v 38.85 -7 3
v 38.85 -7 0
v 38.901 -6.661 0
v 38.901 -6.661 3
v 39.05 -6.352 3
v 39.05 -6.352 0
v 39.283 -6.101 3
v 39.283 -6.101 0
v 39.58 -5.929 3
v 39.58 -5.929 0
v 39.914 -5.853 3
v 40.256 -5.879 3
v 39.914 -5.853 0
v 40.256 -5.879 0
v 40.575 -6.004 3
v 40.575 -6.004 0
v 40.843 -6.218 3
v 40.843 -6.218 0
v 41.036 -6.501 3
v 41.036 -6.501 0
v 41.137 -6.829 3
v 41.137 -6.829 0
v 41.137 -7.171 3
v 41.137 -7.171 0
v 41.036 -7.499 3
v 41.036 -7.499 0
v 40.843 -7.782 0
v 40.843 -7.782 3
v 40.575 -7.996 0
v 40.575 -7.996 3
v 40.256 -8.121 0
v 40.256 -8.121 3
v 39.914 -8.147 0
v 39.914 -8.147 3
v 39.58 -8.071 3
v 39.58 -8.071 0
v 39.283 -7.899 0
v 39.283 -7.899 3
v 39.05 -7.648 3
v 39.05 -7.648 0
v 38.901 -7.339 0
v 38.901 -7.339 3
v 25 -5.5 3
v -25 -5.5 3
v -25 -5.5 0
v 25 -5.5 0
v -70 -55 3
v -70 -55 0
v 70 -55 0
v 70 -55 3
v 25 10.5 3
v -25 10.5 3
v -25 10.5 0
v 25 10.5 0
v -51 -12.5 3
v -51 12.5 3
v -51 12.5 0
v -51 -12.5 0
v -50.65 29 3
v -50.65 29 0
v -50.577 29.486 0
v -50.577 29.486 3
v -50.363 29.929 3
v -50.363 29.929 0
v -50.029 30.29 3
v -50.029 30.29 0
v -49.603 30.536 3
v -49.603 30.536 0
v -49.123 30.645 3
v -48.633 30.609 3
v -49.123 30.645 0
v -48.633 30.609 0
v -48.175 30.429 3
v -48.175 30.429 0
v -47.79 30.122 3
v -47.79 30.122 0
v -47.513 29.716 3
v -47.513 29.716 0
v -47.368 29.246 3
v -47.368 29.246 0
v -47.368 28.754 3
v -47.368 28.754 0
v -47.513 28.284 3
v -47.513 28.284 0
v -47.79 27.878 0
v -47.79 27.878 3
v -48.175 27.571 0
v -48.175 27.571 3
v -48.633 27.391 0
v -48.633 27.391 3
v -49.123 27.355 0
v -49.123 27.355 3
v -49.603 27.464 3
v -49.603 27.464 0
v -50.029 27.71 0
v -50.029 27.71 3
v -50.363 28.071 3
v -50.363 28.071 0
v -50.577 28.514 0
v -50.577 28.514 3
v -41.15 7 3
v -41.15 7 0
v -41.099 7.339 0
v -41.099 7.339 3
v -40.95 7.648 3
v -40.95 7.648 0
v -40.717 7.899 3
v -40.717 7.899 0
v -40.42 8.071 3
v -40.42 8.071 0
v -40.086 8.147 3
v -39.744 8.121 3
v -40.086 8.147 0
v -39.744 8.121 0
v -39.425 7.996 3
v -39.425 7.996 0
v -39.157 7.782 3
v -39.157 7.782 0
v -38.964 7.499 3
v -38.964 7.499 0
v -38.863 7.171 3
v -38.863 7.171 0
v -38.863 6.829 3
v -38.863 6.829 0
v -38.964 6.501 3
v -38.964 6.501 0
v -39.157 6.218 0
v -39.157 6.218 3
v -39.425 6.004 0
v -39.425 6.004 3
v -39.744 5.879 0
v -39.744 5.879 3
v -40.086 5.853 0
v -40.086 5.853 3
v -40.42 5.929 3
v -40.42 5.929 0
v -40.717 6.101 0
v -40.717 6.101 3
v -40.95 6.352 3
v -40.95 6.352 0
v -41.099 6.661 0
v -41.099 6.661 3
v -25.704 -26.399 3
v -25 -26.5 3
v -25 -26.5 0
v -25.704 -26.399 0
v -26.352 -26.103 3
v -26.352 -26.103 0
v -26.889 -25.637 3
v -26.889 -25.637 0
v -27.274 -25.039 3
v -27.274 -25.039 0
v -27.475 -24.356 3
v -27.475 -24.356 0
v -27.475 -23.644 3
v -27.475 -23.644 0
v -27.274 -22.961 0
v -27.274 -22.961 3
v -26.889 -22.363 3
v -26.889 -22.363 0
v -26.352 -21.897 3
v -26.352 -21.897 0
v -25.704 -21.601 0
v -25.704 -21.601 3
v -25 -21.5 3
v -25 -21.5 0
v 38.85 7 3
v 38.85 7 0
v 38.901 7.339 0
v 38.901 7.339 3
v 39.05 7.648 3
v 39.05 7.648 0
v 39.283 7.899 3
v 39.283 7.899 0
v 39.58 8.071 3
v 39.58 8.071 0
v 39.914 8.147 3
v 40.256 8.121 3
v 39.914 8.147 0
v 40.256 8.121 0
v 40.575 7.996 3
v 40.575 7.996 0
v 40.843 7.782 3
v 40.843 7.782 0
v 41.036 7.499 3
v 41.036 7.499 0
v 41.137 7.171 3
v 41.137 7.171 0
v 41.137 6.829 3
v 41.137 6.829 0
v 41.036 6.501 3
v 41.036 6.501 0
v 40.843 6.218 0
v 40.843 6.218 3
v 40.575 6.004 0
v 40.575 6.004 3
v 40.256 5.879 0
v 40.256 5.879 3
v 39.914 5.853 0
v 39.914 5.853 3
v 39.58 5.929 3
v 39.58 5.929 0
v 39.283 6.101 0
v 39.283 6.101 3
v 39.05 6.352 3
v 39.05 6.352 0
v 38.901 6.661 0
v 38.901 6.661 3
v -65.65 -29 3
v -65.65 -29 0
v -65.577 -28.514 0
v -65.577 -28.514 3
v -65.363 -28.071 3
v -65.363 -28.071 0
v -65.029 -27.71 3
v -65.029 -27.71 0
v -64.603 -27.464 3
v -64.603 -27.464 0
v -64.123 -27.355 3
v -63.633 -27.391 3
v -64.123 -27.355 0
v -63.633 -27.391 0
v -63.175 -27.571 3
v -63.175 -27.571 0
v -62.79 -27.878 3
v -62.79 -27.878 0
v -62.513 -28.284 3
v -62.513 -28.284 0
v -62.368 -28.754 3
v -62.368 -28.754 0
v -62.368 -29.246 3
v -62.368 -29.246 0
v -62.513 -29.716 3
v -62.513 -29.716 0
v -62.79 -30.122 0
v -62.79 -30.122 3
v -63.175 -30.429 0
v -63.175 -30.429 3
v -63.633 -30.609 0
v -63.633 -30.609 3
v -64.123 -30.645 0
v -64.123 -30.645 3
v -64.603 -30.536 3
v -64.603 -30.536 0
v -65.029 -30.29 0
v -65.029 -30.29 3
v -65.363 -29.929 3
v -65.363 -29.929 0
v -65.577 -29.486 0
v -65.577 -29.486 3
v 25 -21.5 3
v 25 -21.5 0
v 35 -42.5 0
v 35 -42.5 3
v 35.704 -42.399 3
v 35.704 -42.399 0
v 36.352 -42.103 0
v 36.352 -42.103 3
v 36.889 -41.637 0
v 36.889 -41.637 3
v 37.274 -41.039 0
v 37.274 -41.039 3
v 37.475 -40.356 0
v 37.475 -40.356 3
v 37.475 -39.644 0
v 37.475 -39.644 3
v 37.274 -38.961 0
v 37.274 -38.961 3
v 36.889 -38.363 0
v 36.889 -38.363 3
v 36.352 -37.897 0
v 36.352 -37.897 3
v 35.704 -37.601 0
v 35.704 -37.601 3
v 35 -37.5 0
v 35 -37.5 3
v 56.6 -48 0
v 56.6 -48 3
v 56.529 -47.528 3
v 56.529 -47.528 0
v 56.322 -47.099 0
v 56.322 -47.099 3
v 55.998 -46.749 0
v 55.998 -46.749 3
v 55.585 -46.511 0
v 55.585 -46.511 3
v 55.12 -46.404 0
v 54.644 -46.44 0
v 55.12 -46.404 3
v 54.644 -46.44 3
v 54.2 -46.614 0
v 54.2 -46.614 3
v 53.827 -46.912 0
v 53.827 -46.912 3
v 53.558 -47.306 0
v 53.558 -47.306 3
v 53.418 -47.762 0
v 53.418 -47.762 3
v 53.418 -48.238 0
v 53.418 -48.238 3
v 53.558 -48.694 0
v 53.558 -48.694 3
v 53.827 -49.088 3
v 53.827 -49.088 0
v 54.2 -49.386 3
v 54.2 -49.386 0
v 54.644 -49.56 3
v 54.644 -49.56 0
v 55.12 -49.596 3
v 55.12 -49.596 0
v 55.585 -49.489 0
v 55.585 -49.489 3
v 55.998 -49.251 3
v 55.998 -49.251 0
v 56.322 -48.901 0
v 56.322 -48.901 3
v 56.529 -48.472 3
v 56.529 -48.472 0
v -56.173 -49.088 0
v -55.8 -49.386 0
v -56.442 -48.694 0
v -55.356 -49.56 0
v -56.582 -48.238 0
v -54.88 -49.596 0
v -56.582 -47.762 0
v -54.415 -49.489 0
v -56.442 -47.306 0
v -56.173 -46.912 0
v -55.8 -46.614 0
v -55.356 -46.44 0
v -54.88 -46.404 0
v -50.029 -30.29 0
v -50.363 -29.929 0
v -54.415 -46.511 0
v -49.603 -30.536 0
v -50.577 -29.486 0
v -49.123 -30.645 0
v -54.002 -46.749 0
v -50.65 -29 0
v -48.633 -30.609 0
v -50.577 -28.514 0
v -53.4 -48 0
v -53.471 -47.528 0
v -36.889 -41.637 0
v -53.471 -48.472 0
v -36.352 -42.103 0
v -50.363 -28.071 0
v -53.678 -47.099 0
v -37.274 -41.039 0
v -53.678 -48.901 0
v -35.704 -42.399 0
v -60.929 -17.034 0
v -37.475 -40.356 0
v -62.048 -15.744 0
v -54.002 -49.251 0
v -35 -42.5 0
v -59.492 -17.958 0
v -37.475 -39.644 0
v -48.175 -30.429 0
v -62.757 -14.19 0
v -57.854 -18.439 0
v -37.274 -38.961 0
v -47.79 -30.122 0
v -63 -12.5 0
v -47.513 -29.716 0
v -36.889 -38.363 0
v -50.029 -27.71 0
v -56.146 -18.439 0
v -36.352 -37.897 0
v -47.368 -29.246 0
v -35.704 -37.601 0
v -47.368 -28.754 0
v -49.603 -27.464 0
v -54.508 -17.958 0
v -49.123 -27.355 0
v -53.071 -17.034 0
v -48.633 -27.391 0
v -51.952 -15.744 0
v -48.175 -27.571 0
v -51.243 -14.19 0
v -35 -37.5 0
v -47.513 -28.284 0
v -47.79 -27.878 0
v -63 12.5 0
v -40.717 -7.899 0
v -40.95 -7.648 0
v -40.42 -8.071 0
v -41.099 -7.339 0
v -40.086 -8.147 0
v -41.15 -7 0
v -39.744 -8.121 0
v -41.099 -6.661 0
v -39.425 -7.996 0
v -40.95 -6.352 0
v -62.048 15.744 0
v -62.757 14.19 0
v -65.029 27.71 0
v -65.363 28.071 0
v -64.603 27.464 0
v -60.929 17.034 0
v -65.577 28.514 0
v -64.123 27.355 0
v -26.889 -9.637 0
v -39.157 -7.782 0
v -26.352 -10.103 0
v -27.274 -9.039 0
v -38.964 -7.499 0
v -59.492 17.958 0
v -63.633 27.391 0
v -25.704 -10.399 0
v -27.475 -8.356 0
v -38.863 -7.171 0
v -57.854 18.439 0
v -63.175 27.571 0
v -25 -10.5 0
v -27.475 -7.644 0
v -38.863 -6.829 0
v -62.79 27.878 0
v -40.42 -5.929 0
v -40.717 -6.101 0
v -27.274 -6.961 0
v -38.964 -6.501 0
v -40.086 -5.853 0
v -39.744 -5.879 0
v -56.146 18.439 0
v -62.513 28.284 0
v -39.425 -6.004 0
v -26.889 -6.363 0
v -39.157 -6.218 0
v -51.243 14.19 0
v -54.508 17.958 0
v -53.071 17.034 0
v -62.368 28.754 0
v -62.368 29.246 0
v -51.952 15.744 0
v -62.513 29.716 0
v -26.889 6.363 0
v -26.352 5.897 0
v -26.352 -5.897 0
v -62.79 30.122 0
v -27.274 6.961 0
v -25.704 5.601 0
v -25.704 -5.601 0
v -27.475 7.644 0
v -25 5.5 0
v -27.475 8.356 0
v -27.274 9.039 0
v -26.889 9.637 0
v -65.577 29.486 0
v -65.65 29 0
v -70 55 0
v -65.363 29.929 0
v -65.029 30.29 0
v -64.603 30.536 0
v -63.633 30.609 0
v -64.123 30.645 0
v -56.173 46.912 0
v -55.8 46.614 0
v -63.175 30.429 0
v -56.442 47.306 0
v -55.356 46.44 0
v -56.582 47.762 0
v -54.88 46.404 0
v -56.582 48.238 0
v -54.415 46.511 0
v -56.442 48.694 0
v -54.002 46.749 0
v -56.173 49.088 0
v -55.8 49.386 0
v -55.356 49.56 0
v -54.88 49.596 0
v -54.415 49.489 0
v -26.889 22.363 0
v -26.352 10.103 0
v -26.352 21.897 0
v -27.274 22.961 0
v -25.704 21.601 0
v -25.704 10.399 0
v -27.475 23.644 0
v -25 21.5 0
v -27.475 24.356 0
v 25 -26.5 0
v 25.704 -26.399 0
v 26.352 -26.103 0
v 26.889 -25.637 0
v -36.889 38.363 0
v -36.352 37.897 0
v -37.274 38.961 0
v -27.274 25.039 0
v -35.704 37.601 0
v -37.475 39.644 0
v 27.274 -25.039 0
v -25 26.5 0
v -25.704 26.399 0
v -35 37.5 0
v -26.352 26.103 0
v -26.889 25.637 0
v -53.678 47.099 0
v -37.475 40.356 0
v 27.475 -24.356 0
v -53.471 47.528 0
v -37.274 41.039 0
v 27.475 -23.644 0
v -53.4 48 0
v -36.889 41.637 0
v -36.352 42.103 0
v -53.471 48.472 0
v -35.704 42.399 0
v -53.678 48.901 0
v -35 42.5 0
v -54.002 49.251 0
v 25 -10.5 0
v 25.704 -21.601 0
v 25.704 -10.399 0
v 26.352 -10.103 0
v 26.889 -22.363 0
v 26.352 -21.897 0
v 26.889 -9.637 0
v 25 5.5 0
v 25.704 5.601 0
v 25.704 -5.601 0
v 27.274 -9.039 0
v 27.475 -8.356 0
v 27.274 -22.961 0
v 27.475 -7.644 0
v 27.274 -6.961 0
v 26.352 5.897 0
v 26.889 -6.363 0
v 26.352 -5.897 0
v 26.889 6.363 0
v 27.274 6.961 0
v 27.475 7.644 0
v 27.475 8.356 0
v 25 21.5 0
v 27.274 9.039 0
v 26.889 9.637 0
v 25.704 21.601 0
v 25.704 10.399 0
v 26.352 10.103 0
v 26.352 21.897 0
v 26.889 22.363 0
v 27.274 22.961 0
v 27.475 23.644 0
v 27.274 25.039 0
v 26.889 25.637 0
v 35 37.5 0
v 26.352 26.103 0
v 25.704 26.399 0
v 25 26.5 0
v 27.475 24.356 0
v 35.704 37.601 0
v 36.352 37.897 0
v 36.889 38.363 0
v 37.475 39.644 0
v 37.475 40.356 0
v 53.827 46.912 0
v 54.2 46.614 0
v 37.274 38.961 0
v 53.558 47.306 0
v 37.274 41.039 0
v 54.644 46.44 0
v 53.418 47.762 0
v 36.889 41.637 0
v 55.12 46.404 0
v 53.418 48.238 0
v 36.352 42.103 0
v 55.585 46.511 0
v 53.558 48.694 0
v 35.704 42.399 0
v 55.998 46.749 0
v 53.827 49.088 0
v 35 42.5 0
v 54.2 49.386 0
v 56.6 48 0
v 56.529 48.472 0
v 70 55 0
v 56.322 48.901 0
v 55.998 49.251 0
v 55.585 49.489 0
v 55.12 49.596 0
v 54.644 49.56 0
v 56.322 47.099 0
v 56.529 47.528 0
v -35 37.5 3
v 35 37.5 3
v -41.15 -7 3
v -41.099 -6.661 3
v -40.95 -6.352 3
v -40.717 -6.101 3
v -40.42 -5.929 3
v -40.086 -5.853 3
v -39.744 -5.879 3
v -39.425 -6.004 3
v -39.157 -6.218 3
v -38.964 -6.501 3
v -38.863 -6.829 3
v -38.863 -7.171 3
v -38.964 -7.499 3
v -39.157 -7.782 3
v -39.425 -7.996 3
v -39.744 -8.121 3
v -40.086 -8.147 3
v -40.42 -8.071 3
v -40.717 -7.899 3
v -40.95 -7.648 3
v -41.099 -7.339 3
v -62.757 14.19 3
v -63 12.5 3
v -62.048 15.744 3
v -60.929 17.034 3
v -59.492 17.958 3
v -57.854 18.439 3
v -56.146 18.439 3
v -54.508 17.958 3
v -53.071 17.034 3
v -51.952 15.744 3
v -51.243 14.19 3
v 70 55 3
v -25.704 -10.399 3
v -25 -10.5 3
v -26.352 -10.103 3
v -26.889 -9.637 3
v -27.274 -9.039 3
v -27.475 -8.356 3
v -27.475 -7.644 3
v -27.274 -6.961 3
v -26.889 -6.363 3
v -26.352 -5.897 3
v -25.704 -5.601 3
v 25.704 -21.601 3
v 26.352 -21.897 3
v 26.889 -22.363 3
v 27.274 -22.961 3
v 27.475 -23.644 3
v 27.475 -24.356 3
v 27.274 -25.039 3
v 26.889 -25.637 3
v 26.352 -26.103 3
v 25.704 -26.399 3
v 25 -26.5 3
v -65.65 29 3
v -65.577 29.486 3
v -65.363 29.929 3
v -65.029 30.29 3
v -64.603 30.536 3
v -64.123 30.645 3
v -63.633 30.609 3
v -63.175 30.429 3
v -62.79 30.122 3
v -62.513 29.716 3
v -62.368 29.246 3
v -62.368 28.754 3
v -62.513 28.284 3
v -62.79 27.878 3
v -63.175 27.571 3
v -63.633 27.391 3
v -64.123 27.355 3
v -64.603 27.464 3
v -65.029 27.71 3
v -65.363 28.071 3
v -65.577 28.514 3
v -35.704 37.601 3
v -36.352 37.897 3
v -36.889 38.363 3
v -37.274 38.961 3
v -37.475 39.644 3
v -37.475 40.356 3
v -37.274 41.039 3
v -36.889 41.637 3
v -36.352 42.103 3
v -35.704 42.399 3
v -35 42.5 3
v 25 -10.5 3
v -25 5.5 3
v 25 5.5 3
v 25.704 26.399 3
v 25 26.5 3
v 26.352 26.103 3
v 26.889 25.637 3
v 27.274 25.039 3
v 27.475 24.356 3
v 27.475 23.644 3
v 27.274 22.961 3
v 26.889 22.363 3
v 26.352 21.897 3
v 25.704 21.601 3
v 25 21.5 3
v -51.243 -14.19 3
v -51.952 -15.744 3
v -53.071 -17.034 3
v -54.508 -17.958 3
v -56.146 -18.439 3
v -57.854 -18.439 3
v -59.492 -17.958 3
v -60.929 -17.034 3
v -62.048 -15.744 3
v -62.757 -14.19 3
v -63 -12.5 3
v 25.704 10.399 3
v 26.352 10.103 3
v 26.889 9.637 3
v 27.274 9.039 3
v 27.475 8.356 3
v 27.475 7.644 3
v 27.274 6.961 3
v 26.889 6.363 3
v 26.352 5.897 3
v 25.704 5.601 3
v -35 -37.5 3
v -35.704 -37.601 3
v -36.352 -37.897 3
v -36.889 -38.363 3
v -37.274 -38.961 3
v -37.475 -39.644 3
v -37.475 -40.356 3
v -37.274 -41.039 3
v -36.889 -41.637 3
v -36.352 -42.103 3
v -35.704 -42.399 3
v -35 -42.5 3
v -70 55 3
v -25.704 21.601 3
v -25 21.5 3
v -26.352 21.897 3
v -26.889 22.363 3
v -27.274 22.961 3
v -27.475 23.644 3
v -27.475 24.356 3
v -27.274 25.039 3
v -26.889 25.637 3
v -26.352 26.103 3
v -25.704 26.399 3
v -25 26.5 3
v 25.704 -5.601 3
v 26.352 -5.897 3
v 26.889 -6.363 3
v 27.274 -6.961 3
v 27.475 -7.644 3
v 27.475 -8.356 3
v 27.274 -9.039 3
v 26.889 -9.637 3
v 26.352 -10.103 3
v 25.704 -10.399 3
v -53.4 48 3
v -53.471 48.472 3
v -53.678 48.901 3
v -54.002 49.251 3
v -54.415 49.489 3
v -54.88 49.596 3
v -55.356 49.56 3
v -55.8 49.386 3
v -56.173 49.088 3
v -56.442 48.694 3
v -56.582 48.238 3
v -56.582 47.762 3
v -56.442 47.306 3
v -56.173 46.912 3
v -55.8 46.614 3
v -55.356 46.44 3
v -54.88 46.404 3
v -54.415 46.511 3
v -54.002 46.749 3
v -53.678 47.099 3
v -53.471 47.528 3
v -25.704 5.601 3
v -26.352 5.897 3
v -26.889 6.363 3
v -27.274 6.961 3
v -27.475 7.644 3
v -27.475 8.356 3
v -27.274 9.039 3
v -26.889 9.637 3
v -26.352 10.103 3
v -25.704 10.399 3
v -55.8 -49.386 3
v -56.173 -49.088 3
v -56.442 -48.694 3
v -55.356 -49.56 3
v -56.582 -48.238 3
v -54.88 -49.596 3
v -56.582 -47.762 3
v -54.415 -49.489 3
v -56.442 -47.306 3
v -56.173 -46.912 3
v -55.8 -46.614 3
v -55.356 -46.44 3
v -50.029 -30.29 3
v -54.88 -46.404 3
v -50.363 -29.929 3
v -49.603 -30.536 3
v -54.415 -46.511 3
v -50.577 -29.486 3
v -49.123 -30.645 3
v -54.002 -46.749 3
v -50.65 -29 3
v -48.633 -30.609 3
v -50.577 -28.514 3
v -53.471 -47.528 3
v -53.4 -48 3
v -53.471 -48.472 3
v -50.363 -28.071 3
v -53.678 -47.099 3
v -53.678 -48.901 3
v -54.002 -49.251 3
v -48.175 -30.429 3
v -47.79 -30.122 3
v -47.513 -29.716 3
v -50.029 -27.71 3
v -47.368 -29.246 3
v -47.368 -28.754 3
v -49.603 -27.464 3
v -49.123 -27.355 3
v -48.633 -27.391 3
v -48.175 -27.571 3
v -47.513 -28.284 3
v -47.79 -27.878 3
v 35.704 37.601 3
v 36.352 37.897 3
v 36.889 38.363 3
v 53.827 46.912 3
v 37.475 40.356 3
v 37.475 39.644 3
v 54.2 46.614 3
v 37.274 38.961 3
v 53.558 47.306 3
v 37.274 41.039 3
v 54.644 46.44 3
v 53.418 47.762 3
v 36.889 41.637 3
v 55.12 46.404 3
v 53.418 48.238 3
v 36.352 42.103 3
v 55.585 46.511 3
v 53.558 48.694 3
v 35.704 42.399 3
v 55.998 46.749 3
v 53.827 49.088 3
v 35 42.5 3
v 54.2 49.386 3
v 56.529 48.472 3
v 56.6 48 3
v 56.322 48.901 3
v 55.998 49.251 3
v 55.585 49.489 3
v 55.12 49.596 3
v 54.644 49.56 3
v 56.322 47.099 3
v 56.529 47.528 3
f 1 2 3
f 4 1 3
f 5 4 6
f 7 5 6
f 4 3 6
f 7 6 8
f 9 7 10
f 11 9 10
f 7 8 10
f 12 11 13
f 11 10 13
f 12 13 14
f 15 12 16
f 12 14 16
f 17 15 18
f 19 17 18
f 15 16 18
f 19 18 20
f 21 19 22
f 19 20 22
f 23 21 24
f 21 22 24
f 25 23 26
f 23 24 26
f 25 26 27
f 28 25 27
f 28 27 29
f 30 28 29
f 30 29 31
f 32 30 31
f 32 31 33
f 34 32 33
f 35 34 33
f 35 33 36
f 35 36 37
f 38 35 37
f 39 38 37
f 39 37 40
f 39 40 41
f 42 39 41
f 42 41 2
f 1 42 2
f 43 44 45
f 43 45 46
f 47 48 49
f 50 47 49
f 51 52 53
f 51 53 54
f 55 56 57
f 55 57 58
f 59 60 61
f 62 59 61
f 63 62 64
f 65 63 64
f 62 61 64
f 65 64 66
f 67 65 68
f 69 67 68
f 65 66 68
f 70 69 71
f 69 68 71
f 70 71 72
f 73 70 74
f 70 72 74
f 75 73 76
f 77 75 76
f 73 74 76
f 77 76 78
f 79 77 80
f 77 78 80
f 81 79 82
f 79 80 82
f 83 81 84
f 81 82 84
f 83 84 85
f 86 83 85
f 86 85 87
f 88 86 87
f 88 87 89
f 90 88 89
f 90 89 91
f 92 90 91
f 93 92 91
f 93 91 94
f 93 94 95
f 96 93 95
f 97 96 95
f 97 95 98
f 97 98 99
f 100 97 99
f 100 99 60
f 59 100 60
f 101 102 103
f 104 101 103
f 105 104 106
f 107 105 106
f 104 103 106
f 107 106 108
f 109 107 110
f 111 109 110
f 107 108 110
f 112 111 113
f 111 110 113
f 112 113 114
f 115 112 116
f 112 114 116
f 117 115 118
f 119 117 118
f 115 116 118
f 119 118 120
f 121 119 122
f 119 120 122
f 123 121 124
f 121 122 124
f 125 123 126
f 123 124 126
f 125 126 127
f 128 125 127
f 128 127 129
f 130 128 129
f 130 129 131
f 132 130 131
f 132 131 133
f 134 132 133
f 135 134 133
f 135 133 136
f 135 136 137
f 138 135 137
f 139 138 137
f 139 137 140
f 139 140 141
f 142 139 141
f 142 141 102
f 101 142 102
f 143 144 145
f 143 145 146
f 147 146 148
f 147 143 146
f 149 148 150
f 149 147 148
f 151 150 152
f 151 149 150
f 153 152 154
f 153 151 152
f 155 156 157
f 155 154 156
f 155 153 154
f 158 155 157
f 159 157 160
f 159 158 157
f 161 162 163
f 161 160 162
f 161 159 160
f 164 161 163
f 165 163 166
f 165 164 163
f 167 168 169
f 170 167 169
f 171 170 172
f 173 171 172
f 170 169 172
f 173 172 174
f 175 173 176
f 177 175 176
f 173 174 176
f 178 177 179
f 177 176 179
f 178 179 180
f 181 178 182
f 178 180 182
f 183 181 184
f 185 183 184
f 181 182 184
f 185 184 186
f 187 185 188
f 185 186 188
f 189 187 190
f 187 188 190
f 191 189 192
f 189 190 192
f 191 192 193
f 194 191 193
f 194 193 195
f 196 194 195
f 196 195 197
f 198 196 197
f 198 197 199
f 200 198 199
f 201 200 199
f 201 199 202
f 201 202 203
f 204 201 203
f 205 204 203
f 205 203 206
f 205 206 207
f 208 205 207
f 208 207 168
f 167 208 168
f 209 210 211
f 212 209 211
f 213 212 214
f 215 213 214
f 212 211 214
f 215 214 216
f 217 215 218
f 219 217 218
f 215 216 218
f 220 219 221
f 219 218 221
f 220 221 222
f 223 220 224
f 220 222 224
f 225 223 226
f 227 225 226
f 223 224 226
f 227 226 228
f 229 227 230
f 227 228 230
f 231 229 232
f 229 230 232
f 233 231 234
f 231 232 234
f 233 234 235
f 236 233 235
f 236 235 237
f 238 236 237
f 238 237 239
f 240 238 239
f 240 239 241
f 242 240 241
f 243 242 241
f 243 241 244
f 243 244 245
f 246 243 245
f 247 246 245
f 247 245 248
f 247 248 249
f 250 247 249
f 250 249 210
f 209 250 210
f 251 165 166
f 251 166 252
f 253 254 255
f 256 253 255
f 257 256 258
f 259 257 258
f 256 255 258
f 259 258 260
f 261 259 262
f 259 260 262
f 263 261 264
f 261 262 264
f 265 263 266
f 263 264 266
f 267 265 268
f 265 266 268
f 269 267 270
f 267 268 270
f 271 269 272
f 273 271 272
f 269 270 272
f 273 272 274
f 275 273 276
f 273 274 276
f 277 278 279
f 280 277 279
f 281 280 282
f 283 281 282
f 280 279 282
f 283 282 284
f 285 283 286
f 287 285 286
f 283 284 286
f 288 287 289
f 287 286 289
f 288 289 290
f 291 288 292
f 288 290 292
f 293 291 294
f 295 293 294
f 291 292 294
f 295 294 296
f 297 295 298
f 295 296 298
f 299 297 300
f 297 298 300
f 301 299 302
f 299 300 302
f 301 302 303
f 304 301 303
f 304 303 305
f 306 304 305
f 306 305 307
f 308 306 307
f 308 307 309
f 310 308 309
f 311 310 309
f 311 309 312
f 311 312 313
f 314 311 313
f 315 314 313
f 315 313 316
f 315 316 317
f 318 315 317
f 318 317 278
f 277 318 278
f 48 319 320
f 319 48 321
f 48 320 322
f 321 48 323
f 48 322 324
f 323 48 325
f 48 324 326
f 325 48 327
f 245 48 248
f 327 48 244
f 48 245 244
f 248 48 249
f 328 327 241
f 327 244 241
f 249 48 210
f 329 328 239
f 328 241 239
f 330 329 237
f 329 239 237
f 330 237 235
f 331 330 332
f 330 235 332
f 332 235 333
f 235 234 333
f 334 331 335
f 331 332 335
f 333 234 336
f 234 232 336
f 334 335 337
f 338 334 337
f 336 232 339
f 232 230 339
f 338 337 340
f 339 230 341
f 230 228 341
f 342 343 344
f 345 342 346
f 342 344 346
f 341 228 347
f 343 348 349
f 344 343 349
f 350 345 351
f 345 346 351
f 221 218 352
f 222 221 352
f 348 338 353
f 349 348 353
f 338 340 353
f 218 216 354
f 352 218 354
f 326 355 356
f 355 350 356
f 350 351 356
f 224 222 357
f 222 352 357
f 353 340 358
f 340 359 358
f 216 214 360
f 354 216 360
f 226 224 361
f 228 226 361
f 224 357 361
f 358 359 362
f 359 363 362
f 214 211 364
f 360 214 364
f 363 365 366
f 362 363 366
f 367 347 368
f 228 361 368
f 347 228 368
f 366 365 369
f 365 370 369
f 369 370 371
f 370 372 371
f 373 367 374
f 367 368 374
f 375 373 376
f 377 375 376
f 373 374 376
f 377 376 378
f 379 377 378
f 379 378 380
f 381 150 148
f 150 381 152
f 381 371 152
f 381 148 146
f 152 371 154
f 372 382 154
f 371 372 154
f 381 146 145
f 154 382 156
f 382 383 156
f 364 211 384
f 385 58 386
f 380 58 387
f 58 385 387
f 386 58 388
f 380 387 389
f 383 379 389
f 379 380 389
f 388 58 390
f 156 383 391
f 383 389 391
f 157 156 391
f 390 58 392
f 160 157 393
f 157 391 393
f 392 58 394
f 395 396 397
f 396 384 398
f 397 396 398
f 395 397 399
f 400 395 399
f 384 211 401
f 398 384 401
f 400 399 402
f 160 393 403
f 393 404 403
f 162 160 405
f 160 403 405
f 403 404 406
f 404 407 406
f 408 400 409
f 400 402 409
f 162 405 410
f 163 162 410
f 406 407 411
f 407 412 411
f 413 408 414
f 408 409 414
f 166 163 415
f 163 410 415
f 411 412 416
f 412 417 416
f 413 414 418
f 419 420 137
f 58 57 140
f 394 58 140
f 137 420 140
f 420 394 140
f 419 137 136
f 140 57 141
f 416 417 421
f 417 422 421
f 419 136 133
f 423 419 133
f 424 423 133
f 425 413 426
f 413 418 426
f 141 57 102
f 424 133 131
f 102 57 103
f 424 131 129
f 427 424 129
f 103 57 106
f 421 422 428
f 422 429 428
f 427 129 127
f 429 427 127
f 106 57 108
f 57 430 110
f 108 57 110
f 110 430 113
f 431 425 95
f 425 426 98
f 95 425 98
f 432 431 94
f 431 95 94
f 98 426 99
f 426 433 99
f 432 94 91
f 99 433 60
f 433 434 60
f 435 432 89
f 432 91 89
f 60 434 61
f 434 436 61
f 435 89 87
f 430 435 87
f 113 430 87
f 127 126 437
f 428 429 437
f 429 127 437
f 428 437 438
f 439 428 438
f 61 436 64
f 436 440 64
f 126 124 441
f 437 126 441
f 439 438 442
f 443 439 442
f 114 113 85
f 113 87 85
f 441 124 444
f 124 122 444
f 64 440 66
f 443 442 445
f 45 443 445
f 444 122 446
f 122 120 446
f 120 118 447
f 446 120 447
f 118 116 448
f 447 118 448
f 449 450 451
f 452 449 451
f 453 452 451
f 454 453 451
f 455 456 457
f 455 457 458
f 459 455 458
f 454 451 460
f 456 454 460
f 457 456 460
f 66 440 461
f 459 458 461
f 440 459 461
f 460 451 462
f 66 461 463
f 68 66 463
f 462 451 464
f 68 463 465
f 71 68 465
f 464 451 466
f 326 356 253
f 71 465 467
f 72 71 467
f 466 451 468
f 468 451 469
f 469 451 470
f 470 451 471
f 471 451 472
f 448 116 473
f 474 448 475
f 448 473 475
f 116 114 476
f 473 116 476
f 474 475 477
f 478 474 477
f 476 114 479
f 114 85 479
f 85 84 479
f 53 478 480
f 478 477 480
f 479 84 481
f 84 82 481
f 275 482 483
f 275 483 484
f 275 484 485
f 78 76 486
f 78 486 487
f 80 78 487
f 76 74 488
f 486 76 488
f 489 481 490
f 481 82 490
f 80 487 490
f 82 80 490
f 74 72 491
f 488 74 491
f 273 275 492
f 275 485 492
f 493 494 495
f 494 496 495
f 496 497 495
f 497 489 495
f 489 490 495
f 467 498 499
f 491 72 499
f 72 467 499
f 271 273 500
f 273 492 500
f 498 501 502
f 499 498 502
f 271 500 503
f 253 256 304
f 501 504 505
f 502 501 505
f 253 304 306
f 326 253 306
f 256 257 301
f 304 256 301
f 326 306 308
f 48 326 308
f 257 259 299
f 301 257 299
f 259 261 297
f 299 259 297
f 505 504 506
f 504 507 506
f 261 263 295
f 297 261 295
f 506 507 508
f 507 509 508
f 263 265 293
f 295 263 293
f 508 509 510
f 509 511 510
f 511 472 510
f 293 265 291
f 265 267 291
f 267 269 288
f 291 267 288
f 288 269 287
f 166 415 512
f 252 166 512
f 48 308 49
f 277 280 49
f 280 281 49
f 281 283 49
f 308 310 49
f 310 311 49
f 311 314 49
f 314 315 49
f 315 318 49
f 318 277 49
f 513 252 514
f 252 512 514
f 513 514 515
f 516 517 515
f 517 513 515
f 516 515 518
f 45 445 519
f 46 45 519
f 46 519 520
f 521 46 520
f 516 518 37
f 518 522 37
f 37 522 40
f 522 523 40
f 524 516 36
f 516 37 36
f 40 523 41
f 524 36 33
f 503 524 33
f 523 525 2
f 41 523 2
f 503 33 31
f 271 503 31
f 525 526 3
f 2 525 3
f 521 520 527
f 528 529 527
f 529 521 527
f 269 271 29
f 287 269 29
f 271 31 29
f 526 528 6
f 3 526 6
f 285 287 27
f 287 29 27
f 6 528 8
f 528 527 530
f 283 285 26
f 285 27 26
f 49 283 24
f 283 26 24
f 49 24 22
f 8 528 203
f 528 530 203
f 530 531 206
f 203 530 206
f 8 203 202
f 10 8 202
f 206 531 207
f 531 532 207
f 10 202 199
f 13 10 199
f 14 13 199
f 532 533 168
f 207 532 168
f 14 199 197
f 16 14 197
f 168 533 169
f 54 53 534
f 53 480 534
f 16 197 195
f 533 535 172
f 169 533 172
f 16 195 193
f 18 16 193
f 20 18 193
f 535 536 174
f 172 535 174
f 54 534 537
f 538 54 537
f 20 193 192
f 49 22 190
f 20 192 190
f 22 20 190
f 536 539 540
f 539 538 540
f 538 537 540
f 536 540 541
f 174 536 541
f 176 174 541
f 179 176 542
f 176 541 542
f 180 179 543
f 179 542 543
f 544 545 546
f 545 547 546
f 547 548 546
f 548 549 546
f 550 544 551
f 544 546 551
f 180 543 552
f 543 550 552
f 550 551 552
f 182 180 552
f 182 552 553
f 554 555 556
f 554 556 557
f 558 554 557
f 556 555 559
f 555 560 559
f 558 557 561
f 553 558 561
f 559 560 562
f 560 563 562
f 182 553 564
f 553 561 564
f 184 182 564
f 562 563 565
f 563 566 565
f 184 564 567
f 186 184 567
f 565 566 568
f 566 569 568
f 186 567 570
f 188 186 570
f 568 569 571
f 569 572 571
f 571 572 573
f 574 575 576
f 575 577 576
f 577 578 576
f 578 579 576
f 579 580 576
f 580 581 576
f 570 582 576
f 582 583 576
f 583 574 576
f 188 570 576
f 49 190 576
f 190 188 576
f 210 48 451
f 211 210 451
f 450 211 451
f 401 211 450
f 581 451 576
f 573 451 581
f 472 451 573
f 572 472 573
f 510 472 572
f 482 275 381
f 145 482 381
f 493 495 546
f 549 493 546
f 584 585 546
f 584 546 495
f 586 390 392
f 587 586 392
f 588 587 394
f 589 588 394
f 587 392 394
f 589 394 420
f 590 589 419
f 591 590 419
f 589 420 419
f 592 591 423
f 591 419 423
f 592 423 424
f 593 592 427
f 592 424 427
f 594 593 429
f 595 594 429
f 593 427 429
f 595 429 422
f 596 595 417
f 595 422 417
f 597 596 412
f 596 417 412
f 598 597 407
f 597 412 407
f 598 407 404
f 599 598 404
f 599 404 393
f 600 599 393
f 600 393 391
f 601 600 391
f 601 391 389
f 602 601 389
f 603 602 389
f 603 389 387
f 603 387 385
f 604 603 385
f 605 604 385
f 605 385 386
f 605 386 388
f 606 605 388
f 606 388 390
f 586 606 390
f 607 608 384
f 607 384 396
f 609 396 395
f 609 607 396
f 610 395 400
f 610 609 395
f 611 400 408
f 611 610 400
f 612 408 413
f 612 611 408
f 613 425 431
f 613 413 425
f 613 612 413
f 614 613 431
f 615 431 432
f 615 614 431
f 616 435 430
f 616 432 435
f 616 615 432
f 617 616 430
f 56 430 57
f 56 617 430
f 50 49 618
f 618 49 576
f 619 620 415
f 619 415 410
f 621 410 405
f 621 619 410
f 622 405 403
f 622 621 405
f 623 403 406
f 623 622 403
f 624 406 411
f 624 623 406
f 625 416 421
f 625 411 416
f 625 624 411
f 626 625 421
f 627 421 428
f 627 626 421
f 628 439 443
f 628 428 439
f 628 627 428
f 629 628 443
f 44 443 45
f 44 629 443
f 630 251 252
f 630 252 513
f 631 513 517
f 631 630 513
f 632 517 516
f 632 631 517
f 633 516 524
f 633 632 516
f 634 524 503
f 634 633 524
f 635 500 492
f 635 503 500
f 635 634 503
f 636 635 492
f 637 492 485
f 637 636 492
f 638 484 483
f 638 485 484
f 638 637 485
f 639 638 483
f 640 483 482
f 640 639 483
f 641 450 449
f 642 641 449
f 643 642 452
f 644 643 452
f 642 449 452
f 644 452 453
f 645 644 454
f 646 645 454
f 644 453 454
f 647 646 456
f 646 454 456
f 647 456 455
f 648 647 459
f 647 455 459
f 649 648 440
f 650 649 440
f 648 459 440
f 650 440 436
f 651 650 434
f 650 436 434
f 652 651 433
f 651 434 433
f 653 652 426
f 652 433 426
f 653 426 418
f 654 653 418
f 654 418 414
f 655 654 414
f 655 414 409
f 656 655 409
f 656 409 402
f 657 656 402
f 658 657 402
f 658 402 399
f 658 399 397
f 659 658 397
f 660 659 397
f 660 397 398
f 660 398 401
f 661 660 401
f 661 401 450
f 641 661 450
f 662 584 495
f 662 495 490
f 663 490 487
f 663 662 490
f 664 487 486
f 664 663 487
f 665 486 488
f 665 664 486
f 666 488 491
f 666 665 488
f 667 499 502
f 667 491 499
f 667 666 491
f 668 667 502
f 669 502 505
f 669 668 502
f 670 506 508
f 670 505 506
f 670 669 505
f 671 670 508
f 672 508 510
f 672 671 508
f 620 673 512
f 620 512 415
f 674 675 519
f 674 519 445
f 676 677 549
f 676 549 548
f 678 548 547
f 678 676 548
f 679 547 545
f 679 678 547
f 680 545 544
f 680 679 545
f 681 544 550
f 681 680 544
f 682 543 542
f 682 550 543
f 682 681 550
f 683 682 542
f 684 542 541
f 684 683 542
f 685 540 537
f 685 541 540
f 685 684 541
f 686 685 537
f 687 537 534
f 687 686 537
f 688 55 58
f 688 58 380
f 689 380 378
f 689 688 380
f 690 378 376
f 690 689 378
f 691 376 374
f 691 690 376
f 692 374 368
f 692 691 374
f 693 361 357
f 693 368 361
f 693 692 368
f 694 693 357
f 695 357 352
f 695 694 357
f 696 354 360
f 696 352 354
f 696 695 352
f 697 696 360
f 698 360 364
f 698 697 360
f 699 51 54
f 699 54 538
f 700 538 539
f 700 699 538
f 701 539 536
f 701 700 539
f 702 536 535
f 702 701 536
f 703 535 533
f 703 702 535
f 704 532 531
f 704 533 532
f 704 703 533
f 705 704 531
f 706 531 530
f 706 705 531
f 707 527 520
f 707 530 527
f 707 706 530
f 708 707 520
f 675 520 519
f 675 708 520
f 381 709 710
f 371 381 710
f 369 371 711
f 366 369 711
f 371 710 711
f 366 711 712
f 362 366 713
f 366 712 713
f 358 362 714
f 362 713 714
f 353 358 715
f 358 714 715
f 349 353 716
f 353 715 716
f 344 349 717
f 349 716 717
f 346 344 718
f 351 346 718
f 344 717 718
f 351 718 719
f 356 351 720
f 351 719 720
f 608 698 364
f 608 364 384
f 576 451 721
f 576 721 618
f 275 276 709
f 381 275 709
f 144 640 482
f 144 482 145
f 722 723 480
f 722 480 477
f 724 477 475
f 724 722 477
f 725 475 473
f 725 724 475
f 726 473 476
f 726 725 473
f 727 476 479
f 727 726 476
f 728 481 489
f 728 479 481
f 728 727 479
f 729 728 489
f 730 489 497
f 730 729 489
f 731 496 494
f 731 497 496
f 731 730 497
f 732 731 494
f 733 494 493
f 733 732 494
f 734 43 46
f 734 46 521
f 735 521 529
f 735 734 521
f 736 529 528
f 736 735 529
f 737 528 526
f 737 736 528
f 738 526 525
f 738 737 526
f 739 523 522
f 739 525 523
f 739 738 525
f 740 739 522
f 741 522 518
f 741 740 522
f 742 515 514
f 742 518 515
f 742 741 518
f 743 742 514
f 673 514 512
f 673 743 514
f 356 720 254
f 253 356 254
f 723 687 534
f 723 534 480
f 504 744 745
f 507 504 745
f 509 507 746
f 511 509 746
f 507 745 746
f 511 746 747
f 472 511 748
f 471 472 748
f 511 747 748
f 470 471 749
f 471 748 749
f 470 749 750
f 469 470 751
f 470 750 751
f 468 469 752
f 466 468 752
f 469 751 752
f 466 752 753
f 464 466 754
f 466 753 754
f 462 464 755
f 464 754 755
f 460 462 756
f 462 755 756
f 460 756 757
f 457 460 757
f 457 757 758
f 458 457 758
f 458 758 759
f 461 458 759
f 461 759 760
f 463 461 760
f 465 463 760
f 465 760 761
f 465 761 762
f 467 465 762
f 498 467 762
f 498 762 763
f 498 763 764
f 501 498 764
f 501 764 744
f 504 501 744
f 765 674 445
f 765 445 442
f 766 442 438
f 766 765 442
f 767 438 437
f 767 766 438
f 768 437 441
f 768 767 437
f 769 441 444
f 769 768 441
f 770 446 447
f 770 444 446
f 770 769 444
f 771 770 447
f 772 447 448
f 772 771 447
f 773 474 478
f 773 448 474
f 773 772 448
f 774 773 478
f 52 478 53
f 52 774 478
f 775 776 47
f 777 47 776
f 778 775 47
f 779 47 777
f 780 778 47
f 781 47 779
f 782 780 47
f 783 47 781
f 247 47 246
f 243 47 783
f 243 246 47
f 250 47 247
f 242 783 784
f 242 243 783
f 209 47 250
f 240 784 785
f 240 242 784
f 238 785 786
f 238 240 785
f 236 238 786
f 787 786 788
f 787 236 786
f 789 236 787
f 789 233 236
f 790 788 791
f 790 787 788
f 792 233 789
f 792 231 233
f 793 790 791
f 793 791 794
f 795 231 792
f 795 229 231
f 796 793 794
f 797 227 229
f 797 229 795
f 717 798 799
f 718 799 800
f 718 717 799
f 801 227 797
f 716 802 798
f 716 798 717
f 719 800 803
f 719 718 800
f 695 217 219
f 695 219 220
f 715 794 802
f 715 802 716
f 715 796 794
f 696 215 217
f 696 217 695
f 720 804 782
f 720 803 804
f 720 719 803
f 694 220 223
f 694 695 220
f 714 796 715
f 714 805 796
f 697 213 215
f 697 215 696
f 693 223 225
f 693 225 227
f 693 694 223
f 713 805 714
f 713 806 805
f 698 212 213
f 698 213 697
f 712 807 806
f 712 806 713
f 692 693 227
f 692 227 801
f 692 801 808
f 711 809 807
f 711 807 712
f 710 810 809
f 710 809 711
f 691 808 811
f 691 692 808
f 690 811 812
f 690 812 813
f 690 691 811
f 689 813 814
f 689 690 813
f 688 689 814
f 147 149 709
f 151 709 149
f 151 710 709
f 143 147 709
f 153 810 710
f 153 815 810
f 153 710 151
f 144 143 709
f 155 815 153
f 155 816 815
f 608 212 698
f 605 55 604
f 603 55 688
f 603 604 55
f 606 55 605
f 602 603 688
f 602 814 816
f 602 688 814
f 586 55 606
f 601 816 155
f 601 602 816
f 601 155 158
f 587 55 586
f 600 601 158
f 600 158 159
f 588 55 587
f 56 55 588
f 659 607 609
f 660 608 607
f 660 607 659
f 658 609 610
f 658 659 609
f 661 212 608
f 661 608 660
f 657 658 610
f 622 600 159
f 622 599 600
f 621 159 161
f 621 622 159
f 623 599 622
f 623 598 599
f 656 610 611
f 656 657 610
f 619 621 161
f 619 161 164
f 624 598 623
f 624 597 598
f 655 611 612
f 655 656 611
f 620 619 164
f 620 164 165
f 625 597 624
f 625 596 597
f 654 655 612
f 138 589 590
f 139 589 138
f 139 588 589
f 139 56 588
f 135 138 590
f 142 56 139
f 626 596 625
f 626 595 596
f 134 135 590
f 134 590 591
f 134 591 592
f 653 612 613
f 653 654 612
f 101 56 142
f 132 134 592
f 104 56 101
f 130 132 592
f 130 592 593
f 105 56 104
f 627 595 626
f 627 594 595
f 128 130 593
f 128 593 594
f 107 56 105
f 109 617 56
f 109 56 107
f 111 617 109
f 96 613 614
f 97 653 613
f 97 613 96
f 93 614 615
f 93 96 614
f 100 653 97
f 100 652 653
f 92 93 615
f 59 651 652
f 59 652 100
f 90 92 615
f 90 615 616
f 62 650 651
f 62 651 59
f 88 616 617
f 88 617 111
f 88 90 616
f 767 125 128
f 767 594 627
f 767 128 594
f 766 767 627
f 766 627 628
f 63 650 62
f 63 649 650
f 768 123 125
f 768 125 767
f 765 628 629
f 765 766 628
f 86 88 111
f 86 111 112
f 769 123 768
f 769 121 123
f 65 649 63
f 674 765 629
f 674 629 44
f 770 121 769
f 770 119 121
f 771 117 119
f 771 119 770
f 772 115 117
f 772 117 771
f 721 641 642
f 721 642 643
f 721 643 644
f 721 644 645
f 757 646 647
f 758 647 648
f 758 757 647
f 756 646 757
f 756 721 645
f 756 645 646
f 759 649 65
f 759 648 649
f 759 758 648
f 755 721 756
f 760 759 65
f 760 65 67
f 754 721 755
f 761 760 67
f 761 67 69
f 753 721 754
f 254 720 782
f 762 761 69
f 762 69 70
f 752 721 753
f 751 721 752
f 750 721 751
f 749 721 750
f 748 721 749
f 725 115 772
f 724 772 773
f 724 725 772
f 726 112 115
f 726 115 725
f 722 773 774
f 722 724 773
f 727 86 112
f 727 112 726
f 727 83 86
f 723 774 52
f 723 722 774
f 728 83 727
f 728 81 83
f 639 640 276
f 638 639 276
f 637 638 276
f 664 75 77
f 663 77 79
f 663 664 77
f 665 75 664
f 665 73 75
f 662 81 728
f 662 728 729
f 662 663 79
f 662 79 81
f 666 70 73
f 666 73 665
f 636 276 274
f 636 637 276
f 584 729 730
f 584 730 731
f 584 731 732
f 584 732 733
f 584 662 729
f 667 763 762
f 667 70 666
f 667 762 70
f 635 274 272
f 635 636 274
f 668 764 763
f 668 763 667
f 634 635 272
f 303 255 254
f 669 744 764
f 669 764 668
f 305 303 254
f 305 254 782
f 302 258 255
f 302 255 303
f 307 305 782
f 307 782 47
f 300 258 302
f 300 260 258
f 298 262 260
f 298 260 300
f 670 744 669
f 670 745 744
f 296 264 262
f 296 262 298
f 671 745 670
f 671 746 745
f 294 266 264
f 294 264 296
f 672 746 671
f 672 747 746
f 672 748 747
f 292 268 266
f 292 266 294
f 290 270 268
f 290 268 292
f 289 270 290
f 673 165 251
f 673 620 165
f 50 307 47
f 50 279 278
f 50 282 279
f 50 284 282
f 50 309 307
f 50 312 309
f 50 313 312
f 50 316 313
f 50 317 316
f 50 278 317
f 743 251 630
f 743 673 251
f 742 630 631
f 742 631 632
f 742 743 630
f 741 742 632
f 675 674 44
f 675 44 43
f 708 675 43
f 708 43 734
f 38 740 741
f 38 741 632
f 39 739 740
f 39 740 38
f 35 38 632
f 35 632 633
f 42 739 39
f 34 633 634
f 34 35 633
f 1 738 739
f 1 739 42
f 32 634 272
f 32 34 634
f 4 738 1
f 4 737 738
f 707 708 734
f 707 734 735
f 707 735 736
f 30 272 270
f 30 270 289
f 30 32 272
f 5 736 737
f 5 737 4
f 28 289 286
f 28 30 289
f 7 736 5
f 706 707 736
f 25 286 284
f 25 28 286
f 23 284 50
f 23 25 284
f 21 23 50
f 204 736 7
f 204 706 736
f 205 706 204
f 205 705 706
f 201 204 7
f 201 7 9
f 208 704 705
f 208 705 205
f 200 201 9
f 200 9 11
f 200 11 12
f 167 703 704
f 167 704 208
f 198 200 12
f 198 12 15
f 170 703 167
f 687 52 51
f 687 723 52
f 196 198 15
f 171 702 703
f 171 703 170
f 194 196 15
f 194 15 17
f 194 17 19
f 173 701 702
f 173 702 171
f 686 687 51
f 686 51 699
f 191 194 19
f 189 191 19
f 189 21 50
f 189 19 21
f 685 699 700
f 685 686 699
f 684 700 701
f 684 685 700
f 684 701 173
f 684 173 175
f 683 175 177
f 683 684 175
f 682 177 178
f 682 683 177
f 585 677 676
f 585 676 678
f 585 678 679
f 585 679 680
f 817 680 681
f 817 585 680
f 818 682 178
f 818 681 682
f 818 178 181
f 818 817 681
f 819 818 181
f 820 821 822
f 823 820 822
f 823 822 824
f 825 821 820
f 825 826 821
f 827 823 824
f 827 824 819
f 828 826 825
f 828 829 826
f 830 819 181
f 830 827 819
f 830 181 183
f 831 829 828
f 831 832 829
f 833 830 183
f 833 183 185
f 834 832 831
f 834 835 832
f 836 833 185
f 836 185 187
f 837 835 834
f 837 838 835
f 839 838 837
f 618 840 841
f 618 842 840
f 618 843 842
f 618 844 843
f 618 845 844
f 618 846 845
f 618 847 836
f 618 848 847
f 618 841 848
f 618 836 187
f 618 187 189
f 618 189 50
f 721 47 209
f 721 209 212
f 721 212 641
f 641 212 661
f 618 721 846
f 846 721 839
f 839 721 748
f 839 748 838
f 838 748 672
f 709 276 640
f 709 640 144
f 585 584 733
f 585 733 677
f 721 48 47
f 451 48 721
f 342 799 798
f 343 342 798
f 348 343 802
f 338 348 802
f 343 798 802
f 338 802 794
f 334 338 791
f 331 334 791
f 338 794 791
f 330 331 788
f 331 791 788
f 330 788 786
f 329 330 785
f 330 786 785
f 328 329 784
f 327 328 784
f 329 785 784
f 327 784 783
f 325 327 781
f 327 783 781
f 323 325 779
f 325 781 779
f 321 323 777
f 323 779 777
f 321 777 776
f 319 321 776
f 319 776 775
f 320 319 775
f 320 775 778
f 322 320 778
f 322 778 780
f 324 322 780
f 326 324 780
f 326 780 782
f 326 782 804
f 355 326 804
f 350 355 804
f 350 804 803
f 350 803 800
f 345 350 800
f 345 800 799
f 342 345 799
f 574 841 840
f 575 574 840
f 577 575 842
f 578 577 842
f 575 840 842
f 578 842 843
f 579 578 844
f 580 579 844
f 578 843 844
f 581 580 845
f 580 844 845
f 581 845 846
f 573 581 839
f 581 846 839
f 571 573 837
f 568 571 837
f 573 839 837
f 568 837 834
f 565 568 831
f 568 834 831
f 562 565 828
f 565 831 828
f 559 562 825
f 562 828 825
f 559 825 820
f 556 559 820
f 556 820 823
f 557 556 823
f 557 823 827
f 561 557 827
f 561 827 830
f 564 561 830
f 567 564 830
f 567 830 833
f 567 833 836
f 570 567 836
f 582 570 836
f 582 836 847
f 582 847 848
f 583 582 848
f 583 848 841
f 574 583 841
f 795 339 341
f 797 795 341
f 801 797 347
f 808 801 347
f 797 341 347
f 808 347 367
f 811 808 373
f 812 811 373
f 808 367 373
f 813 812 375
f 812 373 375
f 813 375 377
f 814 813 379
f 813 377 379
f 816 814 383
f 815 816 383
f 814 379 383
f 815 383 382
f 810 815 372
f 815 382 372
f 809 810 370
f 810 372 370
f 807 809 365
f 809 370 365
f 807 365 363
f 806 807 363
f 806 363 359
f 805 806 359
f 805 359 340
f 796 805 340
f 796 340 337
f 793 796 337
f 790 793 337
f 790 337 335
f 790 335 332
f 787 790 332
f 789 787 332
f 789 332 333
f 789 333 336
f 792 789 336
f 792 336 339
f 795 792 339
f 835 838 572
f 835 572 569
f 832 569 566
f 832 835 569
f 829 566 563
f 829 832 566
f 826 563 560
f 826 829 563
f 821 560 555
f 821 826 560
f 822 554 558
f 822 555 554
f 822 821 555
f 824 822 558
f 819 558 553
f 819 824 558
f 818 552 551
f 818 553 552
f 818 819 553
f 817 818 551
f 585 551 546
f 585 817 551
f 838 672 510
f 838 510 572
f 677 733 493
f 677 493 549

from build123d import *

# Parameters (mm, degrees)
SKETCH_1_W          = 140
SKETCH_1_H          = 110
EXTRUDE_1_DEPTH     = 3
SKETCH_2_R          = 1.65
CUT_EXTRUDE_1_DEPTH = 90.073003767
SKETCH_3_R          = 1.15
CUT_EXTRUDE_2_DEPTH = 90.073003767
CUT_EXTRUDE_3_DEPTH = 10
CUT_EXTRUDE_4_DEPTH = 10
CUT_EXTRUDE_5_DEPTH = 10
SKETCH_8_R          = 1.6
CUT_EXTRUDE_6_DEPTH = 10


with BuildPart() as part:
    # 草图1 → 凸台-拉伸1 (new body)
    with BuildSketch(Plane.XY):
        Rectangle(SKETCH_1_W, SKETCH_1_H)
    extrude(amount=EXTRUDE_1_DEPTH)

    # 草图2 → 切除-拉伸1 (cut, through all)
    with BuildSketch(Plane(origin=(0, 0, 0), x_dir=(-1, 0, 0), z_dir=(0, 0, -1))):
        with Locations((64, 29)):
            Circle(SKETCH_2_R)
        with Locations((64, -29)):
            Circle(SKETCH_2_R)
        with Locations((49, 29)):
            Circle(SKETCH_2_R)
        with Locations((49, -29)):
            Circle(SKETCH_2_R)
    extrude(amount=-CUT_EXTRUDE_1_DEPTH, mode=Mode.SUBTRACT)

    # 草图3 → 切除-拉伸2 (cut, through all)
    with BuildSketch(Plane(origin=(0, 0, 0), x_dir=(-1, 0, 0), z_dir=(0, 0, -1))):
        with Locations((-40, 7)):
            Circle(SKETCH_3_R)
        with Locations((-40, -7)):
            Circle(SKETCH_3_R)
        with Locations((40, 7)):
            Circle(SKETCH_3_R)
        with Locations((40, -7)):
            Circle(SKETCH_3_R)
    extrude(amount=-CUT_EXTRUDE_2_DEPTH, mode=Mode.SUBTRACT)

    # 草图4 → 切除-拉伸3 (cut)
    with BuildSketch(Plane.XY.offset(3)):
        with BuildLine():
            Line((-25, 42.5), (25, 42.5))
            ThreePointArc((25, 42.5), (27.5, 40), (25, 37.5))
            Line((25, 37.5), (-25, 37.5))
            ThreePointArc((-25, 37.5), (-27.5, 40), (-25, 42.5))
        make_face()
        with BuildLine():
            Line((-25, 26.5), (25, 26.5))
            ThreePointArc((25, 26.5), (27.5, 24), (25, 21.5))
            Line((25, 21.5), (-25, 21.5))
            ThreePointArc((-25, 21.5), (-27.5, 24), (-25, 26.5))
        make_face()
        with BuildLine():
            Line((-25, 10.5), (25, 10.5))
            ThreePointArc((25, 10.5), (27.5, 8), (25, 5.5))
            Line((25, 5.5), (-25, 5.5))
            ThreePointArc((-25, 5.5), (-27.5, 8), (-25, 10.5))
        make_face()
        with BuildLine():
            Line((-25, -5.5), (25, -5.5))
            ThreePointArc((25, -5.5), (27.5, -8), (25, -10.5))
            Line((25, -10.5), (-25, -10.5))
            ThreePointArc((-25, -10.5), (-27.5, -8), (-25, -5.5))
        make_face()
        with BuildLine():
            Line((-25, -21.5), (25, -21.5))
            ThreePointArc((25, -21.5), (27.5, -24), (25, -26.5))
            Line((25, -26.5), (-25, -26.5))
            ThreePointArc((-25, -26.5), (-27.5, -24), (-25, -21.5))
        make_face()
        with BuildLine():
            Line((-25, -37.5), (25, -37.5))
            ThreePointArc((25, -37.5), (27.5, -40), (25, -42.5))
            Line((25, -42.5), (-25, -42.5))
            ThreePointArc((-25, -42.5), (-27.5, -40), (-25, -37.5))
        make_face()
    extrude(amount=-CUT_EXTRUDE_3_DEPTH, mode=Mode.SUBTRACT)

    # 草图5 → 切除-拉伸4 (cut)
    with BuildSketch(Plane.XY.offset(3)):
        with BuildLine():
            Line((-35, 42.5), (35, 42.5))
            ThreePointArc((35, 42.5), (37.5, 40), (35, 37.5))
            Line((35, 37.5), (-35, 37.5))
            ThreePointArc((-35, 37.5), (-37.5, 40), (-35, 42.5))
        make_face()
    cut_extrude_4 = extrude(amount=-CUT_EXTRUDE_4_DEPTH, mode=Mode.SUBTRACT)

    # 镜向1: 切除-拉伸4 across plane
    add(cut_extrude_4.mirror(Plane.ZX), mode=Mode.SUBTRACT)

    # 草图7 → 切除-拉伸5 (cut)
    with BuildSketch(Plane.XY.offset(3)):
        with BuildLine():
            Line((-63, -12.5), (-63, 12.5))
            ThreePointArc((-63, 12.5), (-57, 18.5), (-51, 12.5))
            Line((-51, 12.5), (-51, -12.5))
            ThreePointArc((-51, -12.5), (-57, -18.5), (-63, -12.5))
        make_face()
    extrude(amount=-CUT_EXTRUDE_5_DEPTH, mode=Mode.SUBTRACT)

    # 草图8 → 切除-拉伸6 (cut)
    with BuildSketch(Plane.XY.offset(3)):
        with Locations((55, -48)):
            Circle(SKETCH_8_R)
        with Locations((-55, -48)):
            Circle(SKETCH_8_R)
        with Locations((-55, 48)):
            Circle(SKETCH_8_R)
        with Locations((55, 48)):
            Circle(SKETCH_8_R)
    extrude(amount=-CUT_EXTRUDE_6_DEPTH, mode=Mode.SUBTRACT)


solid = part.part
